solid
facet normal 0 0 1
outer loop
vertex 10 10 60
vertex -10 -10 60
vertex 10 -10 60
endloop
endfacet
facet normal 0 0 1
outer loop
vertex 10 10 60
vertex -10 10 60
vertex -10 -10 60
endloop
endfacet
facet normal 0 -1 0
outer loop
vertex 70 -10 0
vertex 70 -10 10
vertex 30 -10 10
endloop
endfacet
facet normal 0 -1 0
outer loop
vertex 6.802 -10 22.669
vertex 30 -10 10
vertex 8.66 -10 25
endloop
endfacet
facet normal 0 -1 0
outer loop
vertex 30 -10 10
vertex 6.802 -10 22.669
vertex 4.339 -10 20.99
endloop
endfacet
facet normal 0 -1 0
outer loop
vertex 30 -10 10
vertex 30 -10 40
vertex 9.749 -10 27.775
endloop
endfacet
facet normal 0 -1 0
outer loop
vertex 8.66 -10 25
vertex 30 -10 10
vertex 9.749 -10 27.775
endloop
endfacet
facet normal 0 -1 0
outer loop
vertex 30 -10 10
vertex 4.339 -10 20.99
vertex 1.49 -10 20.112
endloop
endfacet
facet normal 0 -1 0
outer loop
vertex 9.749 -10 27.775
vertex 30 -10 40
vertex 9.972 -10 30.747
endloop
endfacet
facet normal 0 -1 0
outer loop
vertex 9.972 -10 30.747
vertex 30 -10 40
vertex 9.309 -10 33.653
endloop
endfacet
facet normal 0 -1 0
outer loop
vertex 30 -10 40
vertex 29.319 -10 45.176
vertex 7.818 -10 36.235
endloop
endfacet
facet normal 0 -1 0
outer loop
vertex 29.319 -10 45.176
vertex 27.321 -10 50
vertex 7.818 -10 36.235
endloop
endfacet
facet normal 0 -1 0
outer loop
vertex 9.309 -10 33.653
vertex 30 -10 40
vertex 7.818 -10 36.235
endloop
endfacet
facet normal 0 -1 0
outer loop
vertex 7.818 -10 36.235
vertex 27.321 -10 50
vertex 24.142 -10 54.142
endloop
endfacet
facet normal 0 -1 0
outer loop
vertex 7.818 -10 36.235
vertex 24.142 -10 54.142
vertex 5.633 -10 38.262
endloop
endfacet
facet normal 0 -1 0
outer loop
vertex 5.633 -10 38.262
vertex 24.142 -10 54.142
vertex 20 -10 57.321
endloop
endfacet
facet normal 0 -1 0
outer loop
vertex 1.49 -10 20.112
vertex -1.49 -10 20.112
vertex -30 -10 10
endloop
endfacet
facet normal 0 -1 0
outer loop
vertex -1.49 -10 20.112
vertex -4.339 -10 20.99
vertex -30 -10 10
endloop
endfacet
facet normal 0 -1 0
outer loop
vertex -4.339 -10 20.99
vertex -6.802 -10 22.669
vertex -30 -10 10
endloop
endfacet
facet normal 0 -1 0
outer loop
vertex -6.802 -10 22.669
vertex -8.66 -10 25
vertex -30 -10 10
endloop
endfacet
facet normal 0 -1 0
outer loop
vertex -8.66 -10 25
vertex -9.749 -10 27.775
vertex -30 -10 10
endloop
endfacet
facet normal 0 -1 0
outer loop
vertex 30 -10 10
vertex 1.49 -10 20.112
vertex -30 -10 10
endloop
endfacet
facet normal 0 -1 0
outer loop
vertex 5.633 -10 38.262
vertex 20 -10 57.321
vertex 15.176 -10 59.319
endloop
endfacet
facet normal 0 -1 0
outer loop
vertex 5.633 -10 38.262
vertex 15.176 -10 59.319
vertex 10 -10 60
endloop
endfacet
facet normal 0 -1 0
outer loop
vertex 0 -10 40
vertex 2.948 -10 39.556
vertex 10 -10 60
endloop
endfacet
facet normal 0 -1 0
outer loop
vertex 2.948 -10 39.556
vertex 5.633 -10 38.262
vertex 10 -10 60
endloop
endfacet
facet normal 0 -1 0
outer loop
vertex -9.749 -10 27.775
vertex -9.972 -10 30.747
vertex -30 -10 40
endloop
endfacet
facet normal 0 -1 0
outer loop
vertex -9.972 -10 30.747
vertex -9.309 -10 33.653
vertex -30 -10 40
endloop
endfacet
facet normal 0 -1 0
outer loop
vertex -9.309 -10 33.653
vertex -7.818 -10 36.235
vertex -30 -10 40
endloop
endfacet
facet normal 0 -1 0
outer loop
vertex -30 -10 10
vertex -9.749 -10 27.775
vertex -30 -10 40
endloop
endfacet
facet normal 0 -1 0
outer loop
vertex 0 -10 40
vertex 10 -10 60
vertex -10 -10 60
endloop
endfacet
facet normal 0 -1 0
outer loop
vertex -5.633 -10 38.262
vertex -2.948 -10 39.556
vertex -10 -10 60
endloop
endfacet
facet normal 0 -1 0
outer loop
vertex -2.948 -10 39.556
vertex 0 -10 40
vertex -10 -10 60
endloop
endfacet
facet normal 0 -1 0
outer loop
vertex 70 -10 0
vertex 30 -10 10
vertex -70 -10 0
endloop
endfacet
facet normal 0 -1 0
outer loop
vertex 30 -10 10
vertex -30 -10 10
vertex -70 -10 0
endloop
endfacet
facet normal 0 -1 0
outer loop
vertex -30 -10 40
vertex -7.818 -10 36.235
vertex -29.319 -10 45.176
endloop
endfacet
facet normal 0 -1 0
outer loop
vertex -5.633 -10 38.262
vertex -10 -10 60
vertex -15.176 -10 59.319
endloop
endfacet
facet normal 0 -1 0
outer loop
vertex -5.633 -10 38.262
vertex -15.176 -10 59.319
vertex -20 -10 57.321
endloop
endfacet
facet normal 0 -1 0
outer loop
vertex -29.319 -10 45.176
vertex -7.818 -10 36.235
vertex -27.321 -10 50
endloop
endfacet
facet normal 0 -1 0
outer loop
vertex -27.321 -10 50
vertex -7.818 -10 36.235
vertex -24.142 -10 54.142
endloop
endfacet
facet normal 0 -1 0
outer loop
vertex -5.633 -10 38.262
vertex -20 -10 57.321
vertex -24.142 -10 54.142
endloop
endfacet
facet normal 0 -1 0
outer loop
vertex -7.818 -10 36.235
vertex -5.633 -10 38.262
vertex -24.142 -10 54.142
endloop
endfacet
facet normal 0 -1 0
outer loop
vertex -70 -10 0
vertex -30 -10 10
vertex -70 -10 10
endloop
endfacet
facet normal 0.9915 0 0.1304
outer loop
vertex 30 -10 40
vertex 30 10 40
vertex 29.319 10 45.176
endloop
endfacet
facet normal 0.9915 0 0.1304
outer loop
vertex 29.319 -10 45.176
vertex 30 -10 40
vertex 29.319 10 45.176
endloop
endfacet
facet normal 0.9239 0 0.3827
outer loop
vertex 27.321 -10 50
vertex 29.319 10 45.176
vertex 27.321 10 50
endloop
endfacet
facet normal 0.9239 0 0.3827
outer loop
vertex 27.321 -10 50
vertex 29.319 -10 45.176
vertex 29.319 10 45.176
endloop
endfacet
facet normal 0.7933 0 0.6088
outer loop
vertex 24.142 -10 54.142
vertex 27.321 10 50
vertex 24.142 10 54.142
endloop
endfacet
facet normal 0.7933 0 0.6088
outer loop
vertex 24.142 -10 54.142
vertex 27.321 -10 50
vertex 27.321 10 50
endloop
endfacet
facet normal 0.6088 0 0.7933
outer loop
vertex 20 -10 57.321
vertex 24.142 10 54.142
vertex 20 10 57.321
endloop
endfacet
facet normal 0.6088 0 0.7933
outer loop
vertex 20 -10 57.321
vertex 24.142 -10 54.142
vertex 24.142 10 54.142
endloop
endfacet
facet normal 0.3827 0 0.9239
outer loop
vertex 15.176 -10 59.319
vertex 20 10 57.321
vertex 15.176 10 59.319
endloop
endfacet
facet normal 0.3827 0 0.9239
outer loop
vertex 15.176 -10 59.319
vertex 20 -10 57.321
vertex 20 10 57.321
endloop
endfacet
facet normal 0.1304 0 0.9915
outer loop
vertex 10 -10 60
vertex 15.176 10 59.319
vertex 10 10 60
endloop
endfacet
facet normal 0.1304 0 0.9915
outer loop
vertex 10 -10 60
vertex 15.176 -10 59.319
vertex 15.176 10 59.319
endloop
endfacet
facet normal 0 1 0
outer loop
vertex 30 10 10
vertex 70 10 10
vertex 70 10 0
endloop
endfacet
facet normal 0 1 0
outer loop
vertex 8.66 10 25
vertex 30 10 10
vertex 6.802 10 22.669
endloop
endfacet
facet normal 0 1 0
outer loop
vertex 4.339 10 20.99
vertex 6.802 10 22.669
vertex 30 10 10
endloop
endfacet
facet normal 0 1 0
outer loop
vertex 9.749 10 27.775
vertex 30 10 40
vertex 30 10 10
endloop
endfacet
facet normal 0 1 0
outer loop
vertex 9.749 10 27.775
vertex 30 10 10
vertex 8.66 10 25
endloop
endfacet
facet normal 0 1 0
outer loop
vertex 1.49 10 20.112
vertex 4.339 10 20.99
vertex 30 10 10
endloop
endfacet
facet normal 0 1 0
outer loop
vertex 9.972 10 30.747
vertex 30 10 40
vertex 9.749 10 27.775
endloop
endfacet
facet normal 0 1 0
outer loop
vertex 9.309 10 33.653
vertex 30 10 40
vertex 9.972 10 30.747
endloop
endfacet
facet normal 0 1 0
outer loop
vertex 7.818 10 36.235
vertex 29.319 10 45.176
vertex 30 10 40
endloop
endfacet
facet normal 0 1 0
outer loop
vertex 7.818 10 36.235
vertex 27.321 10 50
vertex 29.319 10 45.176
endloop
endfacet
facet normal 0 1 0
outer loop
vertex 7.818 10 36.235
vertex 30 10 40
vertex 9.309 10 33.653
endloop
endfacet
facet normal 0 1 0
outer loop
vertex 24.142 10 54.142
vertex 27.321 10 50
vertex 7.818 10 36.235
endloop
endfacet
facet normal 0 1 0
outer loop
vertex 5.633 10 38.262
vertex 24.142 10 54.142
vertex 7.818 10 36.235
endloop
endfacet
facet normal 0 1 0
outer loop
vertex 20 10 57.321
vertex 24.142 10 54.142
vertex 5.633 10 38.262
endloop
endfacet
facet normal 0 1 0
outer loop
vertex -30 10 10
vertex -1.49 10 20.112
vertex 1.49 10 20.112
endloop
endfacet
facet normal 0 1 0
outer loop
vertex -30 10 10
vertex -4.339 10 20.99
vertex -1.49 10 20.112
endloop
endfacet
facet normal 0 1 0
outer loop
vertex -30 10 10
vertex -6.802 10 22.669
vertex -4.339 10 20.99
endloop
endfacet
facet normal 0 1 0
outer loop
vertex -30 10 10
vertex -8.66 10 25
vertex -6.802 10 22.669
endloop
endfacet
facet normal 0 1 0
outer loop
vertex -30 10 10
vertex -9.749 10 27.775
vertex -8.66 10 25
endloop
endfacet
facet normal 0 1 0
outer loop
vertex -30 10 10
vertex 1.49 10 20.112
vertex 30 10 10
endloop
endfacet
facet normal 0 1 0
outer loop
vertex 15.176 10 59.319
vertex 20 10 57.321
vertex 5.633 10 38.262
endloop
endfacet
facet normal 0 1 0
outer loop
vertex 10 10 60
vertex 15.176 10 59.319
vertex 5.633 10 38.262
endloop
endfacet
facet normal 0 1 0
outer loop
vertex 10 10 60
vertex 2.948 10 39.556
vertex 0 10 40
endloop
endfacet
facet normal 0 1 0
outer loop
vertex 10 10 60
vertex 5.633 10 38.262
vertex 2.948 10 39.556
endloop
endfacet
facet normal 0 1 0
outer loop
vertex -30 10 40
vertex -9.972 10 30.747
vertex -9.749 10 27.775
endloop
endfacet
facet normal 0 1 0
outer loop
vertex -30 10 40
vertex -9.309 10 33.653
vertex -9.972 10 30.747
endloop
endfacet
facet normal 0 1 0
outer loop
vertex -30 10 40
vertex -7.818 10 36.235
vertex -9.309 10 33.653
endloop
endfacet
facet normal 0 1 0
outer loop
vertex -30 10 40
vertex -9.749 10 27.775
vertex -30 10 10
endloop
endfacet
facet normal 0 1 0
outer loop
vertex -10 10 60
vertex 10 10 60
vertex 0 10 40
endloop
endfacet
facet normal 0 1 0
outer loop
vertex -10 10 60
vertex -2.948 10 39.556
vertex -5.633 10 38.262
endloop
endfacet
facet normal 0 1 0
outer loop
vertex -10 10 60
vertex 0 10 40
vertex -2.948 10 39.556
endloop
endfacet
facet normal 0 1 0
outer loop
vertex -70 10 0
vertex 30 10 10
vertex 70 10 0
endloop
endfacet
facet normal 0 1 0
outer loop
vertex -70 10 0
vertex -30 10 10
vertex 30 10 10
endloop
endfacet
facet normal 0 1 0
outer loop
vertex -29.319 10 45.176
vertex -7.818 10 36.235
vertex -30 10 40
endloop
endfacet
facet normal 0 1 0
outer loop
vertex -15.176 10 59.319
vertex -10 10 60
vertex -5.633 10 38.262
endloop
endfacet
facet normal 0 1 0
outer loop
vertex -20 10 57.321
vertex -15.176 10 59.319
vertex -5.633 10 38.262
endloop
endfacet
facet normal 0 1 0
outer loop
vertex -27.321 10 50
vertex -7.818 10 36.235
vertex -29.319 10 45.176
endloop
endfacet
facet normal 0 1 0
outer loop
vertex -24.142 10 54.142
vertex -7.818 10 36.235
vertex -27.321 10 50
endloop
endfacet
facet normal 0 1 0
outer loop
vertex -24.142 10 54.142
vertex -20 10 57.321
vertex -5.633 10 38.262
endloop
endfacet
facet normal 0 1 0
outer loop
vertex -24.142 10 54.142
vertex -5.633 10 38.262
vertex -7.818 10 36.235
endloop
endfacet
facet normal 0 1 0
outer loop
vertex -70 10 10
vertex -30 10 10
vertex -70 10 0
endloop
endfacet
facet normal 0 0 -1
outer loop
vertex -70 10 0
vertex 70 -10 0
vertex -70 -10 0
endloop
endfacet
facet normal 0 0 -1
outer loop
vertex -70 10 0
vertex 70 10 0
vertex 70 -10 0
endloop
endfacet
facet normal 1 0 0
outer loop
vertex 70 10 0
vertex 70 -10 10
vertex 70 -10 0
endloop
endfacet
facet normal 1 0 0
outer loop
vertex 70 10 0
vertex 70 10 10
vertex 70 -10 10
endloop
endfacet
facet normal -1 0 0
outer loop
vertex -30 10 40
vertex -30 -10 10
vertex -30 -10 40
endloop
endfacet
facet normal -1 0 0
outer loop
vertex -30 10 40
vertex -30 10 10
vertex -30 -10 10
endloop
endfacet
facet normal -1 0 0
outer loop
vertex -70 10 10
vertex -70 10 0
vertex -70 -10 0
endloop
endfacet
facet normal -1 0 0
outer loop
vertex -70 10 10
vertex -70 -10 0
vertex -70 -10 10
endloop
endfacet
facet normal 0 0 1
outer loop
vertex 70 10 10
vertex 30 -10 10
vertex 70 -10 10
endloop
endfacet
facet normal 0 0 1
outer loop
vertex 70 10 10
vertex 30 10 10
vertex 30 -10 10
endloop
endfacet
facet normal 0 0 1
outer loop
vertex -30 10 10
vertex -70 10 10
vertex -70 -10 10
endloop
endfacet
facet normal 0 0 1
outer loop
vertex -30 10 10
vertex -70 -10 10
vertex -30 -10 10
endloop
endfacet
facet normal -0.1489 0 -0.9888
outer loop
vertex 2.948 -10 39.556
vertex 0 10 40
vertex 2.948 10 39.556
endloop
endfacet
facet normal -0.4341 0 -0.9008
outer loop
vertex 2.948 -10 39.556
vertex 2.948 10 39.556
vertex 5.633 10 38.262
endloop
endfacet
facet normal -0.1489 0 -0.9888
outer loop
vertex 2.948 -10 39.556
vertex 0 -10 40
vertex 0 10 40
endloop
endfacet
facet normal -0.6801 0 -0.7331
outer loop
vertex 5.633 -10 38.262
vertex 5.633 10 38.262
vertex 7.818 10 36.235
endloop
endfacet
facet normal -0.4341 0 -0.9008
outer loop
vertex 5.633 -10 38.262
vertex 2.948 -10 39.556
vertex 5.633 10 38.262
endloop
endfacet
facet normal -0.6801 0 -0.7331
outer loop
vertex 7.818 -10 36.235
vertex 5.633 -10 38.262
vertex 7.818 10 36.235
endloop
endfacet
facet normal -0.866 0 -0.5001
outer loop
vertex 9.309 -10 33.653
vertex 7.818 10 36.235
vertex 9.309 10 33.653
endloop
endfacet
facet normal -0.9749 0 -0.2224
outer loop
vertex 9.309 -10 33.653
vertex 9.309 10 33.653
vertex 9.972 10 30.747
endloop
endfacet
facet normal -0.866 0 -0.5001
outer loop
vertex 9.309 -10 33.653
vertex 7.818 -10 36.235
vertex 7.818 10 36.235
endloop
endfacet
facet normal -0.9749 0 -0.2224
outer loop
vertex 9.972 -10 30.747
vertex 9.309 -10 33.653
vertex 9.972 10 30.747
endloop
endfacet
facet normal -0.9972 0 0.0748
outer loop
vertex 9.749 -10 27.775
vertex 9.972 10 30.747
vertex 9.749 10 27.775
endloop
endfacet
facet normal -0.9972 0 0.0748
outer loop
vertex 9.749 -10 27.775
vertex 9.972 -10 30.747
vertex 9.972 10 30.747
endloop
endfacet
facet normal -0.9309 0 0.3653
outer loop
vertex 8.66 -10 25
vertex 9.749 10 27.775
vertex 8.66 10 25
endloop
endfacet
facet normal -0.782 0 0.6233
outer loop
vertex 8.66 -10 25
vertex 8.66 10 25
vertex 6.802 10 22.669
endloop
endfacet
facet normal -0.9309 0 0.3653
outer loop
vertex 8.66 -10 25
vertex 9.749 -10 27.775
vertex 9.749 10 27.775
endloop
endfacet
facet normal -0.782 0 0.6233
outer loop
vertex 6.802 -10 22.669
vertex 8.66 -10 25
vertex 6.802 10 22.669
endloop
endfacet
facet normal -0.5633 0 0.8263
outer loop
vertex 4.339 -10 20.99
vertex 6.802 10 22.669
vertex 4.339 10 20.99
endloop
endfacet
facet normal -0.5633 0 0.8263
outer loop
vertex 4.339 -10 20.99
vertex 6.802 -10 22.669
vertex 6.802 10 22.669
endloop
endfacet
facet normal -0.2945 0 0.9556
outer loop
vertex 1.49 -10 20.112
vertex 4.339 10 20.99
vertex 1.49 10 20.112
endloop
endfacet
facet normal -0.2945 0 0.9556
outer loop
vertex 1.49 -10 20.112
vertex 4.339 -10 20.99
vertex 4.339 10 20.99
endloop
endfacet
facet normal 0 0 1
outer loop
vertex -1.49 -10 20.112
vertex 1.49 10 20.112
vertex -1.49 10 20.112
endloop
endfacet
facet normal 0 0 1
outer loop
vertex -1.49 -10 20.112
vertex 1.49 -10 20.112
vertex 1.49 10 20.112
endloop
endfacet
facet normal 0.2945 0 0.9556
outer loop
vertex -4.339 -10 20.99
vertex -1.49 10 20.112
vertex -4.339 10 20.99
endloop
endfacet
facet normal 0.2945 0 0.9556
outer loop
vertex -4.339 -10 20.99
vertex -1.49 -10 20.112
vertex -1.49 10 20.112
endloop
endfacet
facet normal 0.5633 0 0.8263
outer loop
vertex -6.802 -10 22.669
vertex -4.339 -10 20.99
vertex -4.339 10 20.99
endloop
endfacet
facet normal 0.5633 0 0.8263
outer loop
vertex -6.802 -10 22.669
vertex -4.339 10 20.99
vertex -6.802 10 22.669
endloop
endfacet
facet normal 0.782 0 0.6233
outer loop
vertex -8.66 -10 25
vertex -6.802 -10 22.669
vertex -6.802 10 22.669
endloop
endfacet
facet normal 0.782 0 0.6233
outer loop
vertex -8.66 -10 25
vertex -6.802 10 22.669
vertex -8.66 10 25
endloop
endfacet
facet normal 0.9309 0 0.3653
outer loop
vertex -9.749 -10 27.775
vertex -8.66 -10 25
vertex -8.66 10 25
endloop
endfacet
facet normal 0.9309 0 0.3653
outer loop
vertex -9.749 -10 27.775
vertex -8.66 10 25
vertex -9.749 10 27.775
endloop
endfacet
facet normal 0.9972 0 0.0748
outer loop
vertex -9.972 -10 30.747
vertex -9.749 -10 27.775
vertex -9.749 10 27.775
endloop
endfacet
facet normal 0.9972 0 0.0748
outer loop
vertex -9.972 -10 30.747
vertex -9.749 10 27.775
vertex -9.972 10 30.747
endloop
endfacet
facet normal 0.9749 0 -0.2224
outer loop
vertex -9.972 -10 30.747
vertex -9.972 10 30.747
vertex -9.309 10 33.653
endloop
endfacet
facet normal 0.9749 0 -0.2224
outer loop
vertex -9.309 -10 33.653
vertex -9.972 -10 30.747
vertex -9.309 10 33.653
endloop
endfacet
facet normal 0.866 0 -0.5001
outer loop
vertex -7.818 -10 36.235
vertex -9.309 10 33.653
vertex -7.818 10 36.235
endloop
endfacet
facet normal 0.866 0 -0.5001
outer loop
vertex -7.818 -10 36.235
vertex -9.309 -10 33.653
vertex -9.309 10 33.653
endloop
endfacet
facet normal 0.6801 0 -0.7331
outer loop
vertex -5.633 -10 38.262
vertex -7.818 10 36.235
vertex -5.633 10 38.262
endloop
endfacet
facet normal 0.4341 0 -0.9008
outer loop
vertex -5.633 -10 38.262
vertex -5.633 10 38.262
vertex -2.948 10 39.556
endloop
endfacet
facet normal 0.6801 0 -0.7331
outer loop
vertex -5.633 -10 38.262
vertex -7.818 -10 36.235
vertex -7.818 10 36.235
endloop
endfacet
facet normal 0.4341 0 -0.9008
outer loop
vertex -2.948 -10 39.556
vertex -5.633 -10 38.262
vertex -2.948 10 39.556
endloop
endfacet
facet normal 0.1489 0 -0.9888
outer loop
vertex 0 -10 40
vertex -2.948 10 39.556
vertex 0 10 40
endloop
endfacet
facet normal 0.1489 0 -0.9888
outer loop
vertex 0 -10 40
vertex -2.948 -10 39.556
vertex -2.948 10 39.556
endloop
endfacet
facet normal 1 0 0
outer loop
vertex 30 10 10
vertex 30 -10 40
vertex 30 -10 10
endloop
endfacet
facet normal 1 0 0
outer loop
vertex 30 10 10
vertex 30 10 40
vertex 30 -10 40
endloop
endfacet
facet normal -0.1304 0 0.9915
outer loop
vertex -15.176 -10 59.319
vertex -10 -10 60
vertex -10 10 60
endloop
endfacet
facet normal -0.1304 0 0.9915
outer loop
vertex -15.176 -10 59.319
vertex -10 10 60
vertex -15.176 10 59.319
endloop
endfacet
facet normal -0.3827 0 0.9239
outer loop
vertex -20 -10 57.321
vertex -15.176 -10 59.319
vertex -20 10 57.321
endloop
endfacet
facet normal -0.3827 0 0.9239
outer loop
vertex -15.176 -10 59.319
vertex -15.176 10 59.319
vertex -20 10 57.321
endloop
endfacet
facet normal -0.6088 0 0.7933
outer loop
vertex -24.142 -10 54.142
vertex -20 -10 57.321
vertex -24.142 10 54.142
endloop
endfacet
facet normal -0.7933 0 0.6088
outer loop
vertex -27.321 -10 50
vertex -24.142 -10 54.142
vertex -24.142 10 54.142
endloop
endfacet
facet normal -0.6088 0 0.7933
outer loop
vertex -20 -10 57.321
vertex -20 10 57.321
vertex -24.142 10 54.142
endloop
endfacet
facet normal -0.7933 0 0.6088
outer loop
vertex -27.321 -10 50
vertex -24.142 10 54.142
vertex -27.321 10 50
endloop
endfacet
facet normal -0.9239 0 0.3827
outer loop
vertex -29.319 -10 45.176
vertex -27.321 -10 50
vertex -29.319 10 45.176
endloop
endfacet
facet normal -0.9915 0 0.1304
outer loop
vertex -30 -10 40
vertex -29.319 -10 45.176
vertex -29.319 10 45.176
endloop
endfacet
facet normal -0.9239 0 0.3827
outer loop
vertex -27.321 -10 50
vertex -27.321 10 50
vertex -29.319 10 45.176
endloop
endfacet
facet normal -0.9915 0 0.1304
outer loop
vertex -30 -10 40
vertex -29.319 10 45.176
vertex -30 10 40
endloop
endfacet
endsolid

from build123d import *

# Parameters (mm, degrees)
SKETCH1_R           = 10
BOSS_EXTRUDE1_DEPTH = 10
FILLET1_R           = 20


with BuildPart() as part:
    # Sketch1 → Boss-Extrude1 (new, symmetric)
    with BuildSketch(Plane(origin=(0, 0, 0), x_dir=(-1, 0, 0), z_dir=(0, 1, 0))):
        Polygon((-70, 0), (70, 0), (70, 10), (30, 10), (30, 60), (-30, 60), (-30, 10), (-70, 10), align=None)
        with Locations(Location((0, 30, 0), (0, 0, 90))):
            Circle(SKETCH1_R, mode=Mode.SUBTRACT)
    extrude(amount=BOSS_EXTRUDE1_DEPTH, both=True)

    # Fillet1
    fillet1_edges = [part.edges().sort_by_distance(p)[0] for p in [
        (30, 0, 60),
        (-30, 0, 60),
    ]]
    fillet(fillet1_edges, radius=FILLET1_R)


solid = part.part
